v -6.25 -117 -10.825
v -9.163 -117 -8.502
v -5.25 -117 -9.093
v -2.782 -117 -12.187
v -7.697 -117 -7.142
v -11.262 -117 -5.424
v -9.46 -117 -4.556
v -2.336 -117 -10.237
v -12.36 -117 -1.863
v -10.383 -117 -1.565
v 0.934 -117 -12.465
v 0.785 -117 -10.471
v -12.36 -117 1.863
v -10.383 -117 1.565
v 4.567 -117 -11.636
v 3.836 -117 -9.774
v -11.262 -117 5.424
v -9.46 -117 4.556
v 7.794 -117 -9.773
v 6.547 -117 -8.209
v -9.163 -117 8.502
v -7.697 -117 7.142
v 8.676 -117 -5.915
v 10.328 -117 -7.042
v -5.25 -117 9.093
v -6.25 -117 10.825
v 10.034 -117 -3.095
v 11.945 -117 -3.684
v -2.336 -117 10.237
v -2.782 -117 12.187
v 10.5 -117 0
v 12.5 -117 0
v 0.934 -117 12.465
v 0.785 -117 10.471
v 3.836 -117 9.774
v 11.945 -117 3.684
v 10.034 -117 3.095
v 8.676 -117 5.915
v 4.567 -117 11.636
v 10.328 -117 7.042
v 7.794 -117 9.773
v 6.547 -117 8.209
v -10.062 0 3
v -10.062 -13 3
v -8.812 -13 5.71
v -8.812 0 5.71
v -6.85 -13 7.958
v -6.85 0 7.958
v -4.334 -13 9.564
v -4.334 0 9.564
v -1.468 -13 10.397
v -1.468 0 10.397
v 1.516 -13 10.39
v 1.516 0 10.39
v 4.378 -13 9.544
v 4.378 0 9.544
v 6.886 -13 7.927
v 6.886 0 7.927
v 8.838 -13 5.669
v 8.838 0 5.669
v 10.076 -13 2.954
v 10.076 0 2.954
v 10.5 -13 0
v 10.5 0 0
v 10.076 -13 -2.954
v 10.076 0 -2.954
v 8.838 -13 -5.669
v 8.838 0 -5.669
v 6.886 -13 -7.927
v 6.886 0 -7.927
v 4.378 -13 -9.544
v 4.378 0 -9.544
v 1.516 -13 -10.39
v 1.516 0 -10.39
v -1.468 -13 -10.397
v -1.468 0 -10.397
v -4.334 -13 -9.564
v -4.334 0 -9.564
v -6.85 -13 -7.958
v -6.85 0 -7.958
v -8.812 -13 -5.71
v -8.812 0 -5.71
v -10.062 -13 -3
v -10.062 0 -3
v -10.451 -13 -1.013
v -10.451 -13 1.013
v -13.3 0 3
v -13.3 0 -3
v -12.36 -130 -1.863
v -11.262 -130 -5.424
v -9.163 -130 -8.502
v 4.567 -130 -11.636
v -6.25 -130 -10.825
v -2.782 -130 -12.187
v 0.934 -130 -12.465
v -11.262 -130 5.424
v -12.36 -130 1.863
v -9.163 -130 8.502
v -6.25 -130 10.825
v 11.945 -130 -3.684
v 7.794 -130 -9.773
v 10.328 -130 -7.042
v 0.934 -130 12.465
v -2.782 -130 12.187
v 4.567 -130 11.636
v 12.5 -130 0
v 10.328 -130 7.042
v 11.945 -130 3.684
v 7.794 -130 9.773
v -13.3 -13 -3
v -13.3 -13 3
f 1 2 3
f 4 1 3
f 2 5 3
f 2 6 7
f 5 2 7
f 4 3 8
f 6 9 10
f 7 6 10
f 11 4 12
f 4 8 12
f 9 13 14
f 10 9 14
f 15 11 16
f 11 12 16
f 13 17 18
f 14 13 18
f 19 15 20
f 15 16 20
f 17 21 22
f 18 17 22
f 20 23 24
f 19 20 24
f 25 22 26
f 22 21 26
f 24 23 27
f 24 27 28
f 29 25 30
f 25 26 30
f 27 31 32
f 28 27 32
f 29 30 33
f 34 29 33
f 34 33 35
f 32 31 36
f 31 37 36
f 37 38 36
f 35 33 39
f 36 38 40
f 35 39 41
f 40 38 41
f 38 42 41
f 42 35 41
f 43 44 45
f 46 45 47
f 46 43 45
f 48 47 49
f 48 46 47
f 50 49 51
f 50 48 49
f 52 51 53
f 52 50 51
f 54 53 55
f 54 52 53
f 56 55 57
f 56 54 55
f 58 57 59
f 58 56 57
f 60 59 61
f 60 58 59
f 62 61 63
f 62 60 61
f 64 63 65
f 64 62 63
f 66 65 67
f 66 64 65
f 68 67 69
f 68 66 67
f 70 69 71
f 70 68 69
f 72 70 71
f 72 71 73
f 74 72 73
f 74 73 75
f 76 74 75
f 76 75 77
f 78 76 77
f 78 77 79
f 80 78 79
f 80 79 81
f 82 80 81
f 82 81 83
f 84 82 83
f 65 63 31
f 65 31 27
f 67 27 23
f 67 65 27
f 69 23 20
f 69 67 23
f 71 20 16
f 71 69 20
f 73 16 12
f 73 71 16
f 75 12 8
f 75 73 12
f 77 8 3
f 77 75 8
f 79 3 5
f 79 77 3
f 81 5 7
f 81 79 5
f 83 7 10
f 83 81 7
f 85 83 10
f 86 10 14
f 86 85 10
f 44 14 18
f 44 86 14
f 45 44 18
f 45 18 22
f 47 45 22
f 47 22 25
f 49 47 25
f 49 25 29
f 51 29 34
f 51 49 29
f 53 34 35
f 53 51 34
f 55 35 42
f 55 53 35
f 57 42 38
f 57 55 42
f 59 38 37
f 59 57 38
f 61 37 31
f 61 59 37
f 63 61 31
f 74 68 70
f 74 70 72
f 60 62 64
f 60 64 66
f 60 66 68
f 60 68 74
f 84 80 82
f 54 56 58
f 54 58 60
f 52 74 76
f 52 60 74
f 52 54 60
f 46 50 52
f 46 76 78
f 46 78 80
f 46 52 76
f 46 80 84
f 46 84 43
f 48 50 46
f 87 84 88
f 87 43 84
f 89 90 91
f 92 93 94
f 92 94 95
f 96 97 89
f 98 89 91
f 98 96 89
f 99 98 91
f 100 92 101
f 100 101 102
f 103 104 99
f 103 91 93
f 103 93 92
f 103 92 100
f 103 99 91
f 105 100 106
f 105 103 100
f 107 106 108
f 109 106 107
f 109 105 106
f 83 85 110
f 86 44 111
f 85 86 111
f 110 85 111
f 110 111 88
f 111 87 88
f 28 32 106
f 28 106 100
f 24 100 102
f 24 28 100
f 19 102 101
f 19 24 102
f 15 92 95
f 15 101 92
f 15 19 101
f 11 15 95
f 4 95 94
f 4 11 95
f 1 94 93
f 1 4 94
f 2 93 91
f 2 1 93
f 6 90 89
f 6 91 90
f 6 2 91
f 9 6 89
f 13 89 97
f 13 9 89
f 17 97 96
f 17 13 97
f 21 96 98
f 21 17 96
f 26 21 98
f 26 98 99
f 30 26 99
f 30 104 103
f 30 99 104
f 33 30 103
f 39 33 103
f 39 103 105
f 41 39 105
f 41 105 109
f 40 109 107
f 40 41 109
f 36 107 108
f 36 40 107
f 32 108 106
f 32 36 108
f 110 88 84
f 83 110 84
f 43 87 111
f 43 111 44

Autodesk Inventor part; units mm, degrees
ref_plane "YZ Plane" through (0, 0, 0) normal (1, 0, 0) x (0, 1, 0)
ref_plane "XZ Plane" through (0, 0, 0) normal (0, 1, 0) x (-1, 0, 0)
ref_plane "XY Plane" through (0, 0, 0) normal (0, 0, 1) x (1, 0, 0)
sketch "Szkic1" plane through (0, 0, 0) normal (0, 1, 0) x (-1, 0, 0)
  arc A0 (10.0623, 3) -> (10.0623, -3) centre (0, 0) ccw
  line L0 (13.3003, 3) -> (13.3003, -3)
  line L1 (13.3003, -3) -> (10.0623, -3)
  line L2 (13.3003, 3) -> (10.0623, 3)
  point P0 (13.3003, 0)
  dimension "d0" = 21
  dimension "d1" = 6
  dimension "d2" = 3.238
extrude "Wyciągnięcie proste1" add sketch "Szkic1" against normal blind 13
sketch "Szkic3" plane through (0, -13, 0) normal (0, -1, 0) x (1, 0, 0)
  circle A0 centre (0, 0) radius 10.5
extrude "Wyciągnięcie proste3" add sketch "Szkic3" along normal blind 104
sketch "Szkic4" plane through (0, -117, 0) normal (0, -1, 0) x (1, 0, 0)
  circle A0 centre (0, 0) radius 12.5
  dimension "d9" = 25
extrude "Wyciągnięcie proste4" add sketch "Szkic4" along normal blind 13
properties part number "wal_czlon_2"
